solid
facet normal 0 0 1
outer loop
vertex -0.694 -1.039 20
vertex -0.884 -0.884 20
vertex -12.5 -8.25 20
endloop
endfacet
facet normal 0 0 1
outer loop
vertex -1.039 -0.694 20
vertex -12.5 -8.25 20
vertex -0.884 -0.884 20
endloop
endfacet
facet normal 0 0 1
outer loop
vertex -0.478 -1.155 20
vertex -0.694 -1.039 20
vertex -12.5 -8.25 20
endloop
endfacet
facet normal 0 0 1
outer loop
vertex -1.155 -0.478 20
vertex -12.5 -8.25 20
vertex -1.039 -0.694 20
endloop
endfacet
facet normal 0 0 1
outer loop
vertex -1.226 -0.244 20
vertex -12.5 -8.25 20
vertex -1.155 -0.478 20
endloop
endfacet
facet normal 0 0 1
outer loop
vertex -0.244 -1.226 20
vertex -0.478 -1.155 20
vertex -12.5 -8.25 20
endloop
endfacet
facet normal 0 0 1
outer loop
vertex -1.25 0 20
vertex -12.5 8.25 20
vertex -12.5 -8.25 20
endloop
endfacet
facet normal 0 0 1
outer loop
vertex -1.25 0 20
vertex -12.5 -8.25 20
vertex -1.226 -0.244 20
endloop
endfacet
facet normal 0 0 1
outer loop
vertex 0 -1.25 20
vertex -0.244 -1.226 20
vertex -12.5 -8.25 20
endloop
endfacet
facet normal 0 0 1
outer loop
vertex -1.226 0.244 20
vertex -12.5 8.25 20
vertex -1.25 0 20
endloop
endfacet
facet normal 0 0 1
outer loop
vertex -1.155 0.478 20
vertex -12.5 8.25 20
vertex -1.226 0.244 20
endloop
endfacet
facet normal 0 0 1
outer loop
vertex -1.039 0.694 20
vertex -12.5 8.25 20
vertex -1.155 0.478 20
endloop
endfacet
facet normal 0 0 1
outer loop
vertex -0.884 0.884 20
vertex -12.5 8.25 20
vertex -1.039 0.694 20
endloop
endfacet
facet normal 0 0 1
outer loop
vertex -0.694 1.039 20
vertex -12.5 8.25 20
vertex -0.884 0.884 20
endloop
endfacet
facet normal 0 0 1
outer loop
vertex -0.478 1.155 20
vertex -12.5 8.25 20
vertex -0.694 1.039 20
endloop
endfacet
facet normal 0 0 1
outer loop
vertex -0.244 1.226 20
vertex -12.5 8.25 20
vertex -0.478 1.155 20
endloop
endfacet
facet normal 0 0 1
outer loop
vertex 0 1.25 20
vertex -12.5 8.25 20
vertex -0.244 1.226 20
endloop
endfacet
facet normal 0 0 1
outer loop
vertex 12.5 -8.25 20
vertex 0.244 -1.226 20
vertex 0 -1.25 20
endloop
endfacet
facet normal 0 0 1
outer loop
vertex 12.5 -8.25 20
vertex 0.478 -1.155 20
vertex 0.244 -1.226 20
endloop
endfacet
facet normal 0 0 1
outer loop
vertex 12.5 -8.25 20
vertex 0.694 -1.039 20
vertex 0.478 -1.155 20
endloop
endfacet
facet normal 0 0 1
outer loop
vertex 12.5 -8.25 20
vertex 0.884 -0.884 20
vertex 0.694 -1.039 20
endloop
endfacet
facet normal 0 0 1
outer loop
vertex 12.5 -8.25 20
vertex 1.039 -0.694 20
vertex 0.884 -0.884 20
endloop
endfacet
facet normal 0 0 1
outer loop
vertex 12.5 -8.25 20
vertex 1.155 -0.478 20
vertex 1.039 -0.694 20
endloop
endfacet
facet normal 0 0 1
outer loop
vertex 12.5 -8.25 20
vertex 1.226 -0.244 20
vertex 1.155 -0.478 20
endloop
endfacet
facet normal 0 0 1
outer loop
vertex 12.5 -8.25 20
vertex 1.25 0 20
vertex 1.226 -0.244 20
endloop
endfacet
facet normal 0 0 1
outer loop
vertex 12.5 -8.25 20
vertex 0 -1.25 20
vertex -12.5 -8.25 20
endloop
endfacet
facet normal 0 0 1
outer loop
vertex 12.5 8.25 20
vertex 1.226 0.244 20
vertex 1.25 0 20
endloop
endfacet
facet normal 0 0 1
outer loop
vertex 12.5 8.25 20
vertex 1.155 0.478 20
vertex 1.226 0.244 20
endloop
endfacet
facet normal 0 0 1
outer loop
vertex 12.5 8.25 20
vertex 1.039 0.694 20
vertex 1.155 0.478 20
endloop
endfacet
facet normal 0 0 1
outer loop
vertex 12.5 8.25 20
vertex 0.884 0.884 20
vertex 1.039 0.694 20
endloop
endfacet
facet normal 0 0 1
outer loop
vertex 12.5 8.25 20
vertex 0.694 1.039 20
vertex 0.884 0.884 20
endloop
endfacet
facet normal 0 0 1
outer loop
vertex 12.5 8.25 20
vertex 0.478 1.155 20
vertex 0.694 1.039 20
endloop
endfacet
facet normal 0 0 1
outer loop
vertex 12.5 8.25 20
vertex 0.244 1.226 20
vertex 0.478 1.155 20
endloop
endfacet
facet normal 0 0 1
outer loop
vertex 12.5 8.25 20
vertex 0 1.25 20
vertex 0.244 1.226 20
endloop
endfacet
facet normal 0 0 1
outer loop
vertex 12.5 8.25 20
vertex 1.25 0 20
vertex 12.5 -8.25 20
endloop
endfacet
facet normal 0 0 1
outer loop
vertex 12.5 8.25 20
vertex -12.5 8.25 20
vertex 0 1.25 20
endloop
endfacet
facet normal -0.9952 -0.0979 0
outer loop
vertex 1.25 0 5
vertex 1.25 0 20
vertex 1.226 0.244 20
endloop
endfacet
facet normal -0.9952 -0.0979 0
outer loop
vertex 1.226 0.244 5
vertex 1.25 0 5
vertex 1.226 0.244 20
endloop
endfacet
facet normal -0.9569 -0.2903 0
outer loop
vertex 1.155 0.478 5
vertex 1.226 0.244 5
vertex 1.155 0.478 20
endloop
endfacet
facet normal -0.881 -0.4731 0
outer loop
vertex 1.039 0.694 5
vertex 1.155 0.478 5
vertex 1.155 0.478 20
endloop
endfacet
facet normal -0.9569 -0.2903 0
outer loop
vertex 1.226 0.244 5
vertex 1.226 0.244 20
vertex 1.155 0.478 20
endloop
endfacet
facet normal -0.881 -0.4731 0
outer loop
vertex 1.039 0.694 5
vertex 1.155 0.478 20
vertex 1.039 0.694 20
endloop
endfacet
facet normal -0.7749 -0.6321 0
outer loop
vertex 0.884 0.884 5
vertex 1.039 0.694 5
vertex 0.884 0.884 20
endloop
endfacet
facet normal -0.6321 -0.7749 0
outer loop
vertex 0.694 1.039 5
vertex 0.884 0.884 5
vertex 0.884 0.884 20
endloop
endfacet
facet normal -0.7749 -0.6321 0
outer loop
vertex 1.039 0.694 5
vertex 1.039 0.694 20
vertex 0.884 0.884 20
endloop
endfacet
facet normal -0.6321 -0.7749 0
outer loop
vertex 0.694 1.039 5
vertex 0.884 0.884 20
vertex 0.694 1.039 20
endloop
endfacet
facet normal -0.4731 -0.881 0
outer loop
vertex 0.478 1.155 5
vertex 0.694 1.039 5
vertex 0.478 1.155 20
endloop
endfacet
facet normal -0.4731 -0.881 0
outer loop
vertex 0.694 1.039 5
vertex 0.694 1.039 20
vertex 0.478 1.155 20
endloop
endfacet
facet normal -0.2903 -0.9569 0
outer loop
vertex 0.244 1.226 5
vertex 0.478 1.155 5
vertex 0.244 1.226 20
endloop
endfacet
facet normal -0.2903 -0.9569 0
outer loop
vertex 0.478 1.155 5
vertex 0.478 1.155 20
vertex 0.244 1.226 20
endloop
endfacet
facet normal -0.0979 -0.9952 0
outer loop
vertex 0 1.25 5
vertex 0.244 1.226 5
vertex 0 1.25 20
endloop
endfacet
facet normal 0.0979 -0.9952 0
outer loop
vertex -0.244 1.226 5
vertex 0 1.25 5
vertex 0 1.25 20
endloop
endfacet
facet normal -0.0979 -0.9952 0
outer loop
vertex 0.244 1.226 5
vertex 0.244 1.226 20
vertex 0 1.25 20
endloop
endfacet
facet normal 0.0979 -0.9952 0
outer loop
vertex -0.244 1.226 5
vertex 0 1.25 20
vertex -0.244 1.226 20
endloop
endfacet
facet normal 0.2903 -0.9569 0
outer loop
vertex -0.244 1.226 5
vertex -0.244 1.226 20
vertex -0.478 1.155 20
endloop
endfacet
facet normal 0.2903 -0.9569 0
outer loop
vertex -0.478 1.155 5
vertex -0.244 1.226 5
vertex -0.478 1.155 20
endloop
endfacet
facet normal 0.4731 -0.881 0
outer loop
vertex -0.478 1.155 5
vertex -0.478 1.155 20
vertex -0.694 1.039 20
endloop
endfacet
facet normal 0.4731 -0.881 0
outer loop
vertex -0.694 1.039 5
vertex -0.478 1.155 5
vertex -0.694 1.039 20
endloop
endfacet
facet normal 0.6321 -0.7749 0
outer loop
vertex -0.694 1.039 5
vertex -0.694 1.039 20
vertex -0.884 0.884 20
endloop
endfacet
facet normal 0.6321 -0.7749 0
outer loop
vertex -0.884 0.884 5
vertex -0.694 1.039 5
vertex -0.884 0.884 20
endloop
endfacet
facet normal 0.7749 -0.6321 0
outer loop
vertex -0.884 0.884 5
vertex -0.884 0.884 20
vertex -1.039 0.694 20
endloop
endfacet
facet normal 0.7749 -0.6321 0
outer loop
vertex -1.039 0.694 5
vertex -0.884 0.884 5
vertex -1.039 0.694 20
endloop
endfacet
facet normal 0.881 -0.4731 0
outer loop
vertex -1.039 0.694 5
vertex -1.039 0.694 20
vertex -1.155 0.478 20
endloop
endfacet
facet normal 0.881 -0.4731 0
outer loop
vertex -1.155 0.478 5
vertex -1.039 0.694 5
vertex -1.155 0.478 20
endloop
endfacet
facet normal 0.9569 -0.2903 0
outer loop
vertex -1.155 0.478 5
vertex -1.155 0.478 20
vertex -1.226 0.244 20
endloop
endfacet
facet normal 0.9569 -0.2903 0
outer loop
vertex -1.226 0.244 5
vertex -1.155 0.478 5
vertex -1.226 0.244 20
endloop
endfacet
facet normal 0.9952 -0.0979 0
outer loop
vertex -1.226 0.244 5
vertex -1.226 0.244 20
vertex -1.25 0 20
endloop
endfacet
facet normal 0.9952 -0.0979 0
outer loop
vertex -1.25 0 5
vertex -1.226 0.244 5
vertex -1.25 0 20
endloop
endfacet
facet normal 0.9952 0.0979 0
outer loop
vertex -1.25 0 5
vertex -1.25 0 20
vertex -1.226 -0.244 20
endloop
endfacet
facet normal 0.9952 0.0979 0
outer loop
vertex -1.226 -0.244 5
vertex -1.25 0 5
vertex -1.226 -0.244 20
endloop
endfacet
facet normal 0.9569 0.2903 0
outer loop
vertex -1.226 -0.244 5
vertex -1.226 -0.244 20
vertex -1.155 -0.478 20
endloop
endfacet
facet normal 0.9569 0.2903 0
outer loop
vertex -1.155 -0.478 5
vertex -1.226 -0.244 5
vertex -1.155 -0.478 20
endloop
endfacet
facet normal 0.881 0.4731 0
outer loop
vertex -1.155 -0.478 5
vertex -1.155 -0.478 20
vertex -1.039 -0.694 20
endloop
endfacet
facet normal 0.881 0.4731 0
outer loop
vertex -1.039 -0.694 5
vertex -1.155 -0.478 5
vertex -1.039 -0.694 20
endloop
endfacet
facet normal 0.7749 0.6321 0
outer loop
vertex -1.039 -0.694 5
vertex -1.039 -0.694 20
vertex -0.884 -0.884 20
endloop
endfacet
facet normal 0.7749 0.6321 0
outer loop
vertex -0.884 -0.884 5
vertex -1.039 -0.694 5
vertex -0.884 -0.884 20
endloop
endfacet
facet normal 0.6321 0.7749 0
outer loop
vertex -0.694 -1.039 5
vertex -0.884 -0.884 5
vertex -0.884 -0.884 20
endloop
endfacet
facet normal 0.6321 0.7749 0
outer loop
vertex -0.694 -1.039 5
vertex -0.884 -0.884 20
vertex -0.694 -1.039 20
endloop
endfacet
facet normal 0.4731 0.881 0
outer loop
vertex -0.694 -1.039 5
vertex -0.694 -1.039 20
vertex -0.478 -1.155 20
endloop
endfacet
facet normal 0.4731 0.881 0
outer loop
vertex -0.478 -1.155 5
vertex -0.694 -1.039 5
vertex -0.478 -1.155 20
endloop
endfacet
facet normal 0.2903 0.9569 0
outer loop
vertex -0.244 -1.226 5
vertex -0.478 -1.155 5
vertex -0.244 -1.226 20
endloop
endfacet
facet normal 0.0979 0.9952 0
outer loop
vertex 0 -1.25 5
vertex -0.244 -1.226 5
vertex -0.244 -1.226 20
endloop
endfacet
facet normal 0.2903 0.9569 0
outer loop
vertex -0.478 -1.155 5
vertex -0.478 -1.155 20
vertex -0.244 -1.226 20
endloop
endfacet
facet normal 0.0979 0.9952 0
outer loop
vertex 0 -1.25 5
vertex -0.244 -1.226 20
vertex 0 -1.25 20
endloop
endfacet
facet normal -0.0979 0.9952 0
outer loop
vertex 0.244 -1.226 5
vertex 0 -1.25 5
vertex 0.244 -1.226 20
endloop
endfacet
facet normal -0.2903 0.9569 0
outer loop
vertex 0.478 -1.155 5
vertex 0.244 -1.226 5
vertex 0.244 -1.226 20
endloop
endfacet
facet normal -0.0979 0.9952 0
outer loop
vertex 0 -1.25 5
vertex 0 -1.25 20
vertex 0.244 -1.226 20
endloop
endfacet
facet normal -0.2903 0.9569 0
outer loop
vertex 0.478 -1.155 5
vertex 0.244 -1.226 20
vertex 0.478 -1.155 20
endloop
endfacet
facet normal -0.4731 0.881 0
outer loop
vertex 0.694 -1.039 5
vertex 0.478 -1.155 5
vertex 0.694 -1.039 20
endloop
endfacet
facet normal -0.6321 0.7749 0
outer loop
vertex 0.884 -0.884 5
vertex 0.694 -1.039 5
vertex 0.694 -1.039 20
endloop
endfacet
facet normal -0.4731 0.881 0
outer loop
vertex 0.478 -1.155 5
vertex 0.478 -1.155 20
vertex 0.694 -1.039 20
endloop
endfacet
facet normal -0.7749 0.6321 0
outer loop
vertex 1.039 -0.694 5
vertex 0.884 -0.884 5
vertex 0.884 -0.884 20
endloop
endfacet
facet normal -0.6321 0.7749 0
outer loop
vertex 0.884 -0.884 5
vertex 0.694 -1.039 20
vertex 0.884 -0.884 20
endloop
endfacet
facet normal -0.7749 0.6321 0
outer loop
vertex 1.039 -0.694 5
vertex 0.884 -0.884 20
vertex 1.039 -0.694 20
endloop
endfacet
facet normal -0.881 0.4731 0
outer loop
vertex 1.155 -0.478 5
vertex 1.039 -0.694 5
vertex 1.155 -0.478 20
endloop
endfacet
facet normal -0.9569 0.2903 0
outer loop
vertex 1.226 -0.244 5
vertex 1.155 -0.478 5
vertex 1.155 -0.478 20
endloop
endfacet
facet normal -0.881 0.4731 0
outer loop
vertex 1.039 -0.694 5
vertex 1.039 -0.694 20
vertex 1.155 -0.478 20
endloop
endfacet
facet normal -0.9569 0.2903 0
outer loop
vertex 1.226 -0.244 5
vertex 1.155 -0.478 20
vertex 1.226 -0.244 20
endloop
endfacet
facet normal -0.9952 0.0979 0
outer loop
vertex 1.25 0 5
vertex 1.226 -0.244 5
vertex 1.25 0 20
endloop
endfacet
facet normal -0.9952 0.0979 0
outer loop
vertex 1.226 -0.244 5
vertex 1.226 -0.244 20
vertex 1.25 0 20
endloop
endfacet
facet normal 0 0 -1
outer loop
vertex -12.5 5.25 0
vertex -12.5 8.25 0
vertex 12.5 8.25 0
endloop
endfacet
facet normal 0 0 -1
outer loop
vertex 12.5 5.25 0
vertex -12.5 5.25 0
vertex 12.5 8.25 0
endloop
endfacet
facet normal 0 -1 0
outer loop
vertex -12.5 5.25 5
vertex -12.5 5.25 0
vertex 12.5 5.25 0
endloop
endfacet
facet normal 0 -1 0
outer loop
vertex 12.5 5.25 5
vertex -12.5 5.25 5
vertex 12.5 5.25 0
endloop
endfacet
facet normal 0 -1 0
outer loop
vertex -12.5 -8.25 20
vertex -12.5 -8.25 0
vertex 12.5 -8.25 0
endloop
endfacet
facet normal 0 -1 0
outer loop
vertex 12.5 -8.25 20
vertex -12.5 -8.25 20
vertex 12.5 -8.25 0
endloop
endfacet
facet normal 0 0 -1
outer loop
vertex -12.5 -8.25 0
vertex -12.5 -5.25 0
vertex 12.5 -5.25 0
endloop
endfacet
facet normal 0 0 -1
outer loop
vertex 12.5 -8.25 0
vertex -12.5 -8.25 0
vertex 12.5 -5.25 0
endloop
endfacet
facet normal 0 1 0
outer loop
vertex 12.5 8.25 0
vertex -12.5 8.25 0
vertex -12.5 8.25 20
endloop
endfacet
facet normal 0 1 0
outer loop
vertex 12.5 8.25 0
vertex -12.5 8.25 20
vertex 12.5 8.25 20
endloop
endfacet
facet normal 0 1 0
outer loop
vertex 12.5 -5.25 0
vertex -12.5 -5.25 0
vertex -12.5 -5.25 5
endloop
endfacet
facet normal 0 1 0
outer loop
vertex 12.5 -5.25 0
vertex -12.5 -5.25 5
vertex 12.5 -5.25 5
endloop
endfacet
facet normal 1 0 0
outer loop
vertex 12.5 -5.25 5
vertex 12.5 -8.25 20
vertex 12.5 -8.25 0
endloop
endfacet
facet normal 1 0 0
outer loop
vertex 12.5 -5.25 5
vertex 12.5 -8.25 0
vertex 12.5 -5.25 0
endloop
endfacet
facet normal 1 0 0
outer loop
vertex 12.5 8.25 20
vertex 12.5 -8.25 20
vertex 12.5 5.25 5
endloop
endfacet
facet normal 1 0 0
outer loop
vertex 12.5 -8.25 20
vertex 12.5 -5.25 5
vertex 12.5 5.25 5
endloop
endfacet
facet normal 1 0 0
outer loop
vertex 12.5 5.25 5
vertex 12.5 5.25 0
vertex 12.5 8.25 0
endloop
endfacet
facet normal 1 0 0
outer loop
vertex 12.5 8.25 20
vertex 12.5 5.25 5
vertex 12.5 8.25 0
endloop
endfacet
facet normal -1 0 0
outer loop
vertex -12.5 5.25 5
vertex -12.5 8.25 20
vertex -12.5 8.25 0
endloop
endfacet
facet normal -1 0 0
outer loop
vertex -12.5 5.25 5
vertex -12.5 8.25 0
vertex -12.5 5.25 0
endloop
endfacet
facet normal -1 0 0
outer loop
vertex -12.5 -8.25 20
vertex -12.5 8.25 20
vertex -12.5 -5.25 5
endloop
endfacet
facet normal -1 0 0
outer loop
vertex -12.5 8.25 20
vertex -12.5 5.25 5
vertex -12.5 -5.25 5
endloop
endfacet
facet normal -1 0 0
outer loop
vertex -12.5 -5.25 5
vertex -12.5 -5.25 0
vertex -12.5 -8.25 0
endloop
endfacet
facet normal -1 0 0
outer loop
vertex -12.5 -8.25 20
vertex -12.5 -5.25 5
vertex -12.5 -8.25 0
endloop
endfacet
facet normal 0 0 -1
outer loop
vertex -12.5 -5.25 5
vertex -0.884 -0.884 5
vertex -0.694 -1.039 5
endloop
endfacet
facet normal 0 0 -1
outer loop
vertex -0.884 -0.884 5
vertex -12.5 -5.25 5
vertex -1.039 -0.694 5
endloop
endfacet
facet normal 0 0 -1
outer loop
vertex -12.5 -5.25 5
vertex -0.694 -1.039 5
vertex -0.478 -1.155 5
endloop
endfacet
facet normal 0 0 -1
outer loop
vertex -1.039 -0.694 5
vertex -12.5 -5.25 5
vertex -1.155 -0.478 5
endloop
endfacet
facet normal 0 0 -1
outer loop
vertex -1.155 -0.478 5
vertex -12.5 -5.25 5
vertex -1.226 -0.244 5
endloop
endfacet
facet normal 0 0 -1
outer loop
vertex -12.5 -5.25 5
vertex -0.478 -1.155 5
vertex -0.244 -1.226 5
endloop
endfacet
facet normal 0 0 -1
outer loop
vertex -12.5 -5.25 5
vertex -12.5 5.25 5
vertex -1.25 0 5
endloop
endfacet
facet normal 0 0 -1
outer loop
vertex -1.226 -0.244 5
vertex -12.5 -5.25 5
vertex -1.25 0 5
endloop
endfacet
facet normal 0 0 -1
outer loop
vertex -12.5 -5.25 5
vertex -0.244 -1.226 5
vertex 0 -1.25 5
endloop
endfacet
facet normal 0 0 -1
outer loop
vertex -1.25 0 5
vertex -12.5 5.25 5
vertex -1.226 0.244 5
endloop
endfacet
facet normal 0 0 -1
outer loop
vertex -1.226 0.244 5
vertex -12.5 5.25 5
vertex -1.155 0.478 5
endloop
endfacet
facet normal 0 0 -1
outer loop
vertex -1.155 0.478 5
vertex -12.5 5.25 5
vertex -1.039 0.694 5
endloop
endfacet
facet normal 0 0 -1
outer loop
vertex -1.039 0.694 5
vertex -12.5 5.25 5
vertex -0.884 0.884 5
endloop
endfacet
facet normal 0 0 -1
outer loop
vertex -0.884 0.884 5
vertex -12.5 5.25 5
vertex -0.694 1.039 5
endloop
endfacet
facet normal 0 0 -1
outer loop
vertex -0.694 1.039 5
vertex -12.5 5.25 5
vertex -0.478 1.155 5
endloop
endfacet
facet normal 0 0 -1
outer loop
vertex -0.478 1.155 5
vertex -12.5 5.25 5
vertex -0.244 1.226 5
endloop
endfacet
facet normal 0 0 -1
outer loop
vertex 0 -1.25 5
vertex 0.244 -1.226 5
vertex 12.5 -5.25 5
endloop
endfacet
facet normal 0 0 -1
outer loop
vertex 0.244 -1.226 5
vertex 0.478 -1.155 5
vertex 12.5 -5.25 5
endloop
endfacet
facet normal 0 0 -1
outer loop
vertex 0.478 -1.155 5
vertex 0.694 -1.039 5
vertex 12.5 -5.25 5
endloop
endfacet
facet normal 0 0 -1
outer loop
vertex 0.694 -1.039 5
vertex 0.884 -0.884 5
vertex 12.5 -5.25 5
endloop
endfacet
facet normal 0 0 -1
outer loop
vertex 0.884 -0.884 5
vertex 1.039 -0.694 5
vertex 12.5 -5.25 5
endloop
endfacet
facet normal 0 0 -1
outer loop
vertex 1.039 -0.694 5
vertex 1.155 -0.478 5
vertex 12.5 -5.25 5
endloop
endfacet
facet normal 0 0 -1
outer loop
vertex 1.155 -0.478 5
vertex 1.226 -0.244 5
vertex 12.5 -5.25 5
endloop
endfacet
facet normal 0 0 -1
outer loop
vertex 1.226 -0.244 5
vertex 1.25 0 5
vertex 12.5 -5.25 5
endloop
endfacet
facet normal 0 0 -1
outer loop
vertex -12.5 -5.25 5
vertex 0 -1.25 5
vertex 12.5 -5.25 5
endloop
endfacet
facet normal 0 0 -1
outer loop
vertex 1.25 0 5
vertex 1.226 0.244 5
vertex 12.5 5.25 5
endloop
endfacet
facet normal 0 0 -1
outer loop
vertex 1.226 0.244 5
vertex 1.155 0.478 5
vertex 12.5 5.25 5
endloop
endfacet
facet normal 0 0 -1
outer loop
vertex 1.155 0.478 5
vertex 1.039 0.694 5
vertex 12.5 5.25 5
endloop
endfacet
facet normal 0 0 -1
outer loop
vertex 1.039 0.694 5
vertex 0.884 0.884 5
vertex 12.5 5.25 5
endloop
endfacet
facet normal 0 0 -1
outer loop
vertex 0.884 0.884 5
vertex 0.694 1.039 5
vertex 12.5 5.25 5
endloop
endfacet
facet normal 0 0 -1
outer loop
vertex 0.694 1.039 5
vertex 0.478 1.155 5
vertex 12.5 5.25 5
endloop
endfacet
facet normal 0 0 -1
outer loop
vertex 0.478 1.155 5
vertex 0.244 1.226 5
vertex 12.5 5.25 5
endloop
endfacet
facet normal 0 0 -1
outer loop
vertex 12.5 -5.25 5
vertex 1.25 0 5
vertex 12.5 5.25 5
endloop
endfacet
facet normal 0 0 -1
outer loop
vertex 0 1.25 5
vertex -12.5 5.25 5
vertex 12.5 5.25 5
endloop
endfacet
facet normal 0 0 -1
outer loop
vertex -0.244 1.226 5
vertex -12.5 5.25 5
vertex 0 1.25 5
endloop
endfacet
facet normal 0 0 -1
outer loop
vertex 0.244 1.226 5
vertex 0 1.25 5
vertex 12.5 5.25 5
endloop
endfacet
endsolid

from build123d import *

# Parameters (mm, degrees)
F0_W     = 25
F0_H     = 3
F0_H_2   = 10.5
F1_DEPTH = 20
F2_DEPTH = 5
F3_R     = 1.25
F4_DEPTH = 20.001


with BuildPart() as f1:
    # F0 (on Top) → F1 (new body)
    with BuildSketch(Plane.XY):
        with Locations((0, 6.75)):
            Rectangle(F0_W, F0_H)
        Rectangle(F0_W, F0_H_2)
        with Locations((0, -6.75)):
            Rectangle(F0_W, F0_H)
    extrude(amount=F1_DEPTH)

    # F0 (on Top) → F2 (cut)
    with BuildSketch(Plane.XY):
        Rectangle(F0_W, F0_H_2)
    extrude(amount=F2_DEPTH, mode=Mode.SUBTRACT)

    # F3 (on face) → F4 (cut, through all)
    with BuildSketch(Plane.XY.offset(20)):
        Circle(F3_R)
    extrude(amount=-F4_DEPTH, mode=Mode.SUBTRACT)


solid = f1.part
